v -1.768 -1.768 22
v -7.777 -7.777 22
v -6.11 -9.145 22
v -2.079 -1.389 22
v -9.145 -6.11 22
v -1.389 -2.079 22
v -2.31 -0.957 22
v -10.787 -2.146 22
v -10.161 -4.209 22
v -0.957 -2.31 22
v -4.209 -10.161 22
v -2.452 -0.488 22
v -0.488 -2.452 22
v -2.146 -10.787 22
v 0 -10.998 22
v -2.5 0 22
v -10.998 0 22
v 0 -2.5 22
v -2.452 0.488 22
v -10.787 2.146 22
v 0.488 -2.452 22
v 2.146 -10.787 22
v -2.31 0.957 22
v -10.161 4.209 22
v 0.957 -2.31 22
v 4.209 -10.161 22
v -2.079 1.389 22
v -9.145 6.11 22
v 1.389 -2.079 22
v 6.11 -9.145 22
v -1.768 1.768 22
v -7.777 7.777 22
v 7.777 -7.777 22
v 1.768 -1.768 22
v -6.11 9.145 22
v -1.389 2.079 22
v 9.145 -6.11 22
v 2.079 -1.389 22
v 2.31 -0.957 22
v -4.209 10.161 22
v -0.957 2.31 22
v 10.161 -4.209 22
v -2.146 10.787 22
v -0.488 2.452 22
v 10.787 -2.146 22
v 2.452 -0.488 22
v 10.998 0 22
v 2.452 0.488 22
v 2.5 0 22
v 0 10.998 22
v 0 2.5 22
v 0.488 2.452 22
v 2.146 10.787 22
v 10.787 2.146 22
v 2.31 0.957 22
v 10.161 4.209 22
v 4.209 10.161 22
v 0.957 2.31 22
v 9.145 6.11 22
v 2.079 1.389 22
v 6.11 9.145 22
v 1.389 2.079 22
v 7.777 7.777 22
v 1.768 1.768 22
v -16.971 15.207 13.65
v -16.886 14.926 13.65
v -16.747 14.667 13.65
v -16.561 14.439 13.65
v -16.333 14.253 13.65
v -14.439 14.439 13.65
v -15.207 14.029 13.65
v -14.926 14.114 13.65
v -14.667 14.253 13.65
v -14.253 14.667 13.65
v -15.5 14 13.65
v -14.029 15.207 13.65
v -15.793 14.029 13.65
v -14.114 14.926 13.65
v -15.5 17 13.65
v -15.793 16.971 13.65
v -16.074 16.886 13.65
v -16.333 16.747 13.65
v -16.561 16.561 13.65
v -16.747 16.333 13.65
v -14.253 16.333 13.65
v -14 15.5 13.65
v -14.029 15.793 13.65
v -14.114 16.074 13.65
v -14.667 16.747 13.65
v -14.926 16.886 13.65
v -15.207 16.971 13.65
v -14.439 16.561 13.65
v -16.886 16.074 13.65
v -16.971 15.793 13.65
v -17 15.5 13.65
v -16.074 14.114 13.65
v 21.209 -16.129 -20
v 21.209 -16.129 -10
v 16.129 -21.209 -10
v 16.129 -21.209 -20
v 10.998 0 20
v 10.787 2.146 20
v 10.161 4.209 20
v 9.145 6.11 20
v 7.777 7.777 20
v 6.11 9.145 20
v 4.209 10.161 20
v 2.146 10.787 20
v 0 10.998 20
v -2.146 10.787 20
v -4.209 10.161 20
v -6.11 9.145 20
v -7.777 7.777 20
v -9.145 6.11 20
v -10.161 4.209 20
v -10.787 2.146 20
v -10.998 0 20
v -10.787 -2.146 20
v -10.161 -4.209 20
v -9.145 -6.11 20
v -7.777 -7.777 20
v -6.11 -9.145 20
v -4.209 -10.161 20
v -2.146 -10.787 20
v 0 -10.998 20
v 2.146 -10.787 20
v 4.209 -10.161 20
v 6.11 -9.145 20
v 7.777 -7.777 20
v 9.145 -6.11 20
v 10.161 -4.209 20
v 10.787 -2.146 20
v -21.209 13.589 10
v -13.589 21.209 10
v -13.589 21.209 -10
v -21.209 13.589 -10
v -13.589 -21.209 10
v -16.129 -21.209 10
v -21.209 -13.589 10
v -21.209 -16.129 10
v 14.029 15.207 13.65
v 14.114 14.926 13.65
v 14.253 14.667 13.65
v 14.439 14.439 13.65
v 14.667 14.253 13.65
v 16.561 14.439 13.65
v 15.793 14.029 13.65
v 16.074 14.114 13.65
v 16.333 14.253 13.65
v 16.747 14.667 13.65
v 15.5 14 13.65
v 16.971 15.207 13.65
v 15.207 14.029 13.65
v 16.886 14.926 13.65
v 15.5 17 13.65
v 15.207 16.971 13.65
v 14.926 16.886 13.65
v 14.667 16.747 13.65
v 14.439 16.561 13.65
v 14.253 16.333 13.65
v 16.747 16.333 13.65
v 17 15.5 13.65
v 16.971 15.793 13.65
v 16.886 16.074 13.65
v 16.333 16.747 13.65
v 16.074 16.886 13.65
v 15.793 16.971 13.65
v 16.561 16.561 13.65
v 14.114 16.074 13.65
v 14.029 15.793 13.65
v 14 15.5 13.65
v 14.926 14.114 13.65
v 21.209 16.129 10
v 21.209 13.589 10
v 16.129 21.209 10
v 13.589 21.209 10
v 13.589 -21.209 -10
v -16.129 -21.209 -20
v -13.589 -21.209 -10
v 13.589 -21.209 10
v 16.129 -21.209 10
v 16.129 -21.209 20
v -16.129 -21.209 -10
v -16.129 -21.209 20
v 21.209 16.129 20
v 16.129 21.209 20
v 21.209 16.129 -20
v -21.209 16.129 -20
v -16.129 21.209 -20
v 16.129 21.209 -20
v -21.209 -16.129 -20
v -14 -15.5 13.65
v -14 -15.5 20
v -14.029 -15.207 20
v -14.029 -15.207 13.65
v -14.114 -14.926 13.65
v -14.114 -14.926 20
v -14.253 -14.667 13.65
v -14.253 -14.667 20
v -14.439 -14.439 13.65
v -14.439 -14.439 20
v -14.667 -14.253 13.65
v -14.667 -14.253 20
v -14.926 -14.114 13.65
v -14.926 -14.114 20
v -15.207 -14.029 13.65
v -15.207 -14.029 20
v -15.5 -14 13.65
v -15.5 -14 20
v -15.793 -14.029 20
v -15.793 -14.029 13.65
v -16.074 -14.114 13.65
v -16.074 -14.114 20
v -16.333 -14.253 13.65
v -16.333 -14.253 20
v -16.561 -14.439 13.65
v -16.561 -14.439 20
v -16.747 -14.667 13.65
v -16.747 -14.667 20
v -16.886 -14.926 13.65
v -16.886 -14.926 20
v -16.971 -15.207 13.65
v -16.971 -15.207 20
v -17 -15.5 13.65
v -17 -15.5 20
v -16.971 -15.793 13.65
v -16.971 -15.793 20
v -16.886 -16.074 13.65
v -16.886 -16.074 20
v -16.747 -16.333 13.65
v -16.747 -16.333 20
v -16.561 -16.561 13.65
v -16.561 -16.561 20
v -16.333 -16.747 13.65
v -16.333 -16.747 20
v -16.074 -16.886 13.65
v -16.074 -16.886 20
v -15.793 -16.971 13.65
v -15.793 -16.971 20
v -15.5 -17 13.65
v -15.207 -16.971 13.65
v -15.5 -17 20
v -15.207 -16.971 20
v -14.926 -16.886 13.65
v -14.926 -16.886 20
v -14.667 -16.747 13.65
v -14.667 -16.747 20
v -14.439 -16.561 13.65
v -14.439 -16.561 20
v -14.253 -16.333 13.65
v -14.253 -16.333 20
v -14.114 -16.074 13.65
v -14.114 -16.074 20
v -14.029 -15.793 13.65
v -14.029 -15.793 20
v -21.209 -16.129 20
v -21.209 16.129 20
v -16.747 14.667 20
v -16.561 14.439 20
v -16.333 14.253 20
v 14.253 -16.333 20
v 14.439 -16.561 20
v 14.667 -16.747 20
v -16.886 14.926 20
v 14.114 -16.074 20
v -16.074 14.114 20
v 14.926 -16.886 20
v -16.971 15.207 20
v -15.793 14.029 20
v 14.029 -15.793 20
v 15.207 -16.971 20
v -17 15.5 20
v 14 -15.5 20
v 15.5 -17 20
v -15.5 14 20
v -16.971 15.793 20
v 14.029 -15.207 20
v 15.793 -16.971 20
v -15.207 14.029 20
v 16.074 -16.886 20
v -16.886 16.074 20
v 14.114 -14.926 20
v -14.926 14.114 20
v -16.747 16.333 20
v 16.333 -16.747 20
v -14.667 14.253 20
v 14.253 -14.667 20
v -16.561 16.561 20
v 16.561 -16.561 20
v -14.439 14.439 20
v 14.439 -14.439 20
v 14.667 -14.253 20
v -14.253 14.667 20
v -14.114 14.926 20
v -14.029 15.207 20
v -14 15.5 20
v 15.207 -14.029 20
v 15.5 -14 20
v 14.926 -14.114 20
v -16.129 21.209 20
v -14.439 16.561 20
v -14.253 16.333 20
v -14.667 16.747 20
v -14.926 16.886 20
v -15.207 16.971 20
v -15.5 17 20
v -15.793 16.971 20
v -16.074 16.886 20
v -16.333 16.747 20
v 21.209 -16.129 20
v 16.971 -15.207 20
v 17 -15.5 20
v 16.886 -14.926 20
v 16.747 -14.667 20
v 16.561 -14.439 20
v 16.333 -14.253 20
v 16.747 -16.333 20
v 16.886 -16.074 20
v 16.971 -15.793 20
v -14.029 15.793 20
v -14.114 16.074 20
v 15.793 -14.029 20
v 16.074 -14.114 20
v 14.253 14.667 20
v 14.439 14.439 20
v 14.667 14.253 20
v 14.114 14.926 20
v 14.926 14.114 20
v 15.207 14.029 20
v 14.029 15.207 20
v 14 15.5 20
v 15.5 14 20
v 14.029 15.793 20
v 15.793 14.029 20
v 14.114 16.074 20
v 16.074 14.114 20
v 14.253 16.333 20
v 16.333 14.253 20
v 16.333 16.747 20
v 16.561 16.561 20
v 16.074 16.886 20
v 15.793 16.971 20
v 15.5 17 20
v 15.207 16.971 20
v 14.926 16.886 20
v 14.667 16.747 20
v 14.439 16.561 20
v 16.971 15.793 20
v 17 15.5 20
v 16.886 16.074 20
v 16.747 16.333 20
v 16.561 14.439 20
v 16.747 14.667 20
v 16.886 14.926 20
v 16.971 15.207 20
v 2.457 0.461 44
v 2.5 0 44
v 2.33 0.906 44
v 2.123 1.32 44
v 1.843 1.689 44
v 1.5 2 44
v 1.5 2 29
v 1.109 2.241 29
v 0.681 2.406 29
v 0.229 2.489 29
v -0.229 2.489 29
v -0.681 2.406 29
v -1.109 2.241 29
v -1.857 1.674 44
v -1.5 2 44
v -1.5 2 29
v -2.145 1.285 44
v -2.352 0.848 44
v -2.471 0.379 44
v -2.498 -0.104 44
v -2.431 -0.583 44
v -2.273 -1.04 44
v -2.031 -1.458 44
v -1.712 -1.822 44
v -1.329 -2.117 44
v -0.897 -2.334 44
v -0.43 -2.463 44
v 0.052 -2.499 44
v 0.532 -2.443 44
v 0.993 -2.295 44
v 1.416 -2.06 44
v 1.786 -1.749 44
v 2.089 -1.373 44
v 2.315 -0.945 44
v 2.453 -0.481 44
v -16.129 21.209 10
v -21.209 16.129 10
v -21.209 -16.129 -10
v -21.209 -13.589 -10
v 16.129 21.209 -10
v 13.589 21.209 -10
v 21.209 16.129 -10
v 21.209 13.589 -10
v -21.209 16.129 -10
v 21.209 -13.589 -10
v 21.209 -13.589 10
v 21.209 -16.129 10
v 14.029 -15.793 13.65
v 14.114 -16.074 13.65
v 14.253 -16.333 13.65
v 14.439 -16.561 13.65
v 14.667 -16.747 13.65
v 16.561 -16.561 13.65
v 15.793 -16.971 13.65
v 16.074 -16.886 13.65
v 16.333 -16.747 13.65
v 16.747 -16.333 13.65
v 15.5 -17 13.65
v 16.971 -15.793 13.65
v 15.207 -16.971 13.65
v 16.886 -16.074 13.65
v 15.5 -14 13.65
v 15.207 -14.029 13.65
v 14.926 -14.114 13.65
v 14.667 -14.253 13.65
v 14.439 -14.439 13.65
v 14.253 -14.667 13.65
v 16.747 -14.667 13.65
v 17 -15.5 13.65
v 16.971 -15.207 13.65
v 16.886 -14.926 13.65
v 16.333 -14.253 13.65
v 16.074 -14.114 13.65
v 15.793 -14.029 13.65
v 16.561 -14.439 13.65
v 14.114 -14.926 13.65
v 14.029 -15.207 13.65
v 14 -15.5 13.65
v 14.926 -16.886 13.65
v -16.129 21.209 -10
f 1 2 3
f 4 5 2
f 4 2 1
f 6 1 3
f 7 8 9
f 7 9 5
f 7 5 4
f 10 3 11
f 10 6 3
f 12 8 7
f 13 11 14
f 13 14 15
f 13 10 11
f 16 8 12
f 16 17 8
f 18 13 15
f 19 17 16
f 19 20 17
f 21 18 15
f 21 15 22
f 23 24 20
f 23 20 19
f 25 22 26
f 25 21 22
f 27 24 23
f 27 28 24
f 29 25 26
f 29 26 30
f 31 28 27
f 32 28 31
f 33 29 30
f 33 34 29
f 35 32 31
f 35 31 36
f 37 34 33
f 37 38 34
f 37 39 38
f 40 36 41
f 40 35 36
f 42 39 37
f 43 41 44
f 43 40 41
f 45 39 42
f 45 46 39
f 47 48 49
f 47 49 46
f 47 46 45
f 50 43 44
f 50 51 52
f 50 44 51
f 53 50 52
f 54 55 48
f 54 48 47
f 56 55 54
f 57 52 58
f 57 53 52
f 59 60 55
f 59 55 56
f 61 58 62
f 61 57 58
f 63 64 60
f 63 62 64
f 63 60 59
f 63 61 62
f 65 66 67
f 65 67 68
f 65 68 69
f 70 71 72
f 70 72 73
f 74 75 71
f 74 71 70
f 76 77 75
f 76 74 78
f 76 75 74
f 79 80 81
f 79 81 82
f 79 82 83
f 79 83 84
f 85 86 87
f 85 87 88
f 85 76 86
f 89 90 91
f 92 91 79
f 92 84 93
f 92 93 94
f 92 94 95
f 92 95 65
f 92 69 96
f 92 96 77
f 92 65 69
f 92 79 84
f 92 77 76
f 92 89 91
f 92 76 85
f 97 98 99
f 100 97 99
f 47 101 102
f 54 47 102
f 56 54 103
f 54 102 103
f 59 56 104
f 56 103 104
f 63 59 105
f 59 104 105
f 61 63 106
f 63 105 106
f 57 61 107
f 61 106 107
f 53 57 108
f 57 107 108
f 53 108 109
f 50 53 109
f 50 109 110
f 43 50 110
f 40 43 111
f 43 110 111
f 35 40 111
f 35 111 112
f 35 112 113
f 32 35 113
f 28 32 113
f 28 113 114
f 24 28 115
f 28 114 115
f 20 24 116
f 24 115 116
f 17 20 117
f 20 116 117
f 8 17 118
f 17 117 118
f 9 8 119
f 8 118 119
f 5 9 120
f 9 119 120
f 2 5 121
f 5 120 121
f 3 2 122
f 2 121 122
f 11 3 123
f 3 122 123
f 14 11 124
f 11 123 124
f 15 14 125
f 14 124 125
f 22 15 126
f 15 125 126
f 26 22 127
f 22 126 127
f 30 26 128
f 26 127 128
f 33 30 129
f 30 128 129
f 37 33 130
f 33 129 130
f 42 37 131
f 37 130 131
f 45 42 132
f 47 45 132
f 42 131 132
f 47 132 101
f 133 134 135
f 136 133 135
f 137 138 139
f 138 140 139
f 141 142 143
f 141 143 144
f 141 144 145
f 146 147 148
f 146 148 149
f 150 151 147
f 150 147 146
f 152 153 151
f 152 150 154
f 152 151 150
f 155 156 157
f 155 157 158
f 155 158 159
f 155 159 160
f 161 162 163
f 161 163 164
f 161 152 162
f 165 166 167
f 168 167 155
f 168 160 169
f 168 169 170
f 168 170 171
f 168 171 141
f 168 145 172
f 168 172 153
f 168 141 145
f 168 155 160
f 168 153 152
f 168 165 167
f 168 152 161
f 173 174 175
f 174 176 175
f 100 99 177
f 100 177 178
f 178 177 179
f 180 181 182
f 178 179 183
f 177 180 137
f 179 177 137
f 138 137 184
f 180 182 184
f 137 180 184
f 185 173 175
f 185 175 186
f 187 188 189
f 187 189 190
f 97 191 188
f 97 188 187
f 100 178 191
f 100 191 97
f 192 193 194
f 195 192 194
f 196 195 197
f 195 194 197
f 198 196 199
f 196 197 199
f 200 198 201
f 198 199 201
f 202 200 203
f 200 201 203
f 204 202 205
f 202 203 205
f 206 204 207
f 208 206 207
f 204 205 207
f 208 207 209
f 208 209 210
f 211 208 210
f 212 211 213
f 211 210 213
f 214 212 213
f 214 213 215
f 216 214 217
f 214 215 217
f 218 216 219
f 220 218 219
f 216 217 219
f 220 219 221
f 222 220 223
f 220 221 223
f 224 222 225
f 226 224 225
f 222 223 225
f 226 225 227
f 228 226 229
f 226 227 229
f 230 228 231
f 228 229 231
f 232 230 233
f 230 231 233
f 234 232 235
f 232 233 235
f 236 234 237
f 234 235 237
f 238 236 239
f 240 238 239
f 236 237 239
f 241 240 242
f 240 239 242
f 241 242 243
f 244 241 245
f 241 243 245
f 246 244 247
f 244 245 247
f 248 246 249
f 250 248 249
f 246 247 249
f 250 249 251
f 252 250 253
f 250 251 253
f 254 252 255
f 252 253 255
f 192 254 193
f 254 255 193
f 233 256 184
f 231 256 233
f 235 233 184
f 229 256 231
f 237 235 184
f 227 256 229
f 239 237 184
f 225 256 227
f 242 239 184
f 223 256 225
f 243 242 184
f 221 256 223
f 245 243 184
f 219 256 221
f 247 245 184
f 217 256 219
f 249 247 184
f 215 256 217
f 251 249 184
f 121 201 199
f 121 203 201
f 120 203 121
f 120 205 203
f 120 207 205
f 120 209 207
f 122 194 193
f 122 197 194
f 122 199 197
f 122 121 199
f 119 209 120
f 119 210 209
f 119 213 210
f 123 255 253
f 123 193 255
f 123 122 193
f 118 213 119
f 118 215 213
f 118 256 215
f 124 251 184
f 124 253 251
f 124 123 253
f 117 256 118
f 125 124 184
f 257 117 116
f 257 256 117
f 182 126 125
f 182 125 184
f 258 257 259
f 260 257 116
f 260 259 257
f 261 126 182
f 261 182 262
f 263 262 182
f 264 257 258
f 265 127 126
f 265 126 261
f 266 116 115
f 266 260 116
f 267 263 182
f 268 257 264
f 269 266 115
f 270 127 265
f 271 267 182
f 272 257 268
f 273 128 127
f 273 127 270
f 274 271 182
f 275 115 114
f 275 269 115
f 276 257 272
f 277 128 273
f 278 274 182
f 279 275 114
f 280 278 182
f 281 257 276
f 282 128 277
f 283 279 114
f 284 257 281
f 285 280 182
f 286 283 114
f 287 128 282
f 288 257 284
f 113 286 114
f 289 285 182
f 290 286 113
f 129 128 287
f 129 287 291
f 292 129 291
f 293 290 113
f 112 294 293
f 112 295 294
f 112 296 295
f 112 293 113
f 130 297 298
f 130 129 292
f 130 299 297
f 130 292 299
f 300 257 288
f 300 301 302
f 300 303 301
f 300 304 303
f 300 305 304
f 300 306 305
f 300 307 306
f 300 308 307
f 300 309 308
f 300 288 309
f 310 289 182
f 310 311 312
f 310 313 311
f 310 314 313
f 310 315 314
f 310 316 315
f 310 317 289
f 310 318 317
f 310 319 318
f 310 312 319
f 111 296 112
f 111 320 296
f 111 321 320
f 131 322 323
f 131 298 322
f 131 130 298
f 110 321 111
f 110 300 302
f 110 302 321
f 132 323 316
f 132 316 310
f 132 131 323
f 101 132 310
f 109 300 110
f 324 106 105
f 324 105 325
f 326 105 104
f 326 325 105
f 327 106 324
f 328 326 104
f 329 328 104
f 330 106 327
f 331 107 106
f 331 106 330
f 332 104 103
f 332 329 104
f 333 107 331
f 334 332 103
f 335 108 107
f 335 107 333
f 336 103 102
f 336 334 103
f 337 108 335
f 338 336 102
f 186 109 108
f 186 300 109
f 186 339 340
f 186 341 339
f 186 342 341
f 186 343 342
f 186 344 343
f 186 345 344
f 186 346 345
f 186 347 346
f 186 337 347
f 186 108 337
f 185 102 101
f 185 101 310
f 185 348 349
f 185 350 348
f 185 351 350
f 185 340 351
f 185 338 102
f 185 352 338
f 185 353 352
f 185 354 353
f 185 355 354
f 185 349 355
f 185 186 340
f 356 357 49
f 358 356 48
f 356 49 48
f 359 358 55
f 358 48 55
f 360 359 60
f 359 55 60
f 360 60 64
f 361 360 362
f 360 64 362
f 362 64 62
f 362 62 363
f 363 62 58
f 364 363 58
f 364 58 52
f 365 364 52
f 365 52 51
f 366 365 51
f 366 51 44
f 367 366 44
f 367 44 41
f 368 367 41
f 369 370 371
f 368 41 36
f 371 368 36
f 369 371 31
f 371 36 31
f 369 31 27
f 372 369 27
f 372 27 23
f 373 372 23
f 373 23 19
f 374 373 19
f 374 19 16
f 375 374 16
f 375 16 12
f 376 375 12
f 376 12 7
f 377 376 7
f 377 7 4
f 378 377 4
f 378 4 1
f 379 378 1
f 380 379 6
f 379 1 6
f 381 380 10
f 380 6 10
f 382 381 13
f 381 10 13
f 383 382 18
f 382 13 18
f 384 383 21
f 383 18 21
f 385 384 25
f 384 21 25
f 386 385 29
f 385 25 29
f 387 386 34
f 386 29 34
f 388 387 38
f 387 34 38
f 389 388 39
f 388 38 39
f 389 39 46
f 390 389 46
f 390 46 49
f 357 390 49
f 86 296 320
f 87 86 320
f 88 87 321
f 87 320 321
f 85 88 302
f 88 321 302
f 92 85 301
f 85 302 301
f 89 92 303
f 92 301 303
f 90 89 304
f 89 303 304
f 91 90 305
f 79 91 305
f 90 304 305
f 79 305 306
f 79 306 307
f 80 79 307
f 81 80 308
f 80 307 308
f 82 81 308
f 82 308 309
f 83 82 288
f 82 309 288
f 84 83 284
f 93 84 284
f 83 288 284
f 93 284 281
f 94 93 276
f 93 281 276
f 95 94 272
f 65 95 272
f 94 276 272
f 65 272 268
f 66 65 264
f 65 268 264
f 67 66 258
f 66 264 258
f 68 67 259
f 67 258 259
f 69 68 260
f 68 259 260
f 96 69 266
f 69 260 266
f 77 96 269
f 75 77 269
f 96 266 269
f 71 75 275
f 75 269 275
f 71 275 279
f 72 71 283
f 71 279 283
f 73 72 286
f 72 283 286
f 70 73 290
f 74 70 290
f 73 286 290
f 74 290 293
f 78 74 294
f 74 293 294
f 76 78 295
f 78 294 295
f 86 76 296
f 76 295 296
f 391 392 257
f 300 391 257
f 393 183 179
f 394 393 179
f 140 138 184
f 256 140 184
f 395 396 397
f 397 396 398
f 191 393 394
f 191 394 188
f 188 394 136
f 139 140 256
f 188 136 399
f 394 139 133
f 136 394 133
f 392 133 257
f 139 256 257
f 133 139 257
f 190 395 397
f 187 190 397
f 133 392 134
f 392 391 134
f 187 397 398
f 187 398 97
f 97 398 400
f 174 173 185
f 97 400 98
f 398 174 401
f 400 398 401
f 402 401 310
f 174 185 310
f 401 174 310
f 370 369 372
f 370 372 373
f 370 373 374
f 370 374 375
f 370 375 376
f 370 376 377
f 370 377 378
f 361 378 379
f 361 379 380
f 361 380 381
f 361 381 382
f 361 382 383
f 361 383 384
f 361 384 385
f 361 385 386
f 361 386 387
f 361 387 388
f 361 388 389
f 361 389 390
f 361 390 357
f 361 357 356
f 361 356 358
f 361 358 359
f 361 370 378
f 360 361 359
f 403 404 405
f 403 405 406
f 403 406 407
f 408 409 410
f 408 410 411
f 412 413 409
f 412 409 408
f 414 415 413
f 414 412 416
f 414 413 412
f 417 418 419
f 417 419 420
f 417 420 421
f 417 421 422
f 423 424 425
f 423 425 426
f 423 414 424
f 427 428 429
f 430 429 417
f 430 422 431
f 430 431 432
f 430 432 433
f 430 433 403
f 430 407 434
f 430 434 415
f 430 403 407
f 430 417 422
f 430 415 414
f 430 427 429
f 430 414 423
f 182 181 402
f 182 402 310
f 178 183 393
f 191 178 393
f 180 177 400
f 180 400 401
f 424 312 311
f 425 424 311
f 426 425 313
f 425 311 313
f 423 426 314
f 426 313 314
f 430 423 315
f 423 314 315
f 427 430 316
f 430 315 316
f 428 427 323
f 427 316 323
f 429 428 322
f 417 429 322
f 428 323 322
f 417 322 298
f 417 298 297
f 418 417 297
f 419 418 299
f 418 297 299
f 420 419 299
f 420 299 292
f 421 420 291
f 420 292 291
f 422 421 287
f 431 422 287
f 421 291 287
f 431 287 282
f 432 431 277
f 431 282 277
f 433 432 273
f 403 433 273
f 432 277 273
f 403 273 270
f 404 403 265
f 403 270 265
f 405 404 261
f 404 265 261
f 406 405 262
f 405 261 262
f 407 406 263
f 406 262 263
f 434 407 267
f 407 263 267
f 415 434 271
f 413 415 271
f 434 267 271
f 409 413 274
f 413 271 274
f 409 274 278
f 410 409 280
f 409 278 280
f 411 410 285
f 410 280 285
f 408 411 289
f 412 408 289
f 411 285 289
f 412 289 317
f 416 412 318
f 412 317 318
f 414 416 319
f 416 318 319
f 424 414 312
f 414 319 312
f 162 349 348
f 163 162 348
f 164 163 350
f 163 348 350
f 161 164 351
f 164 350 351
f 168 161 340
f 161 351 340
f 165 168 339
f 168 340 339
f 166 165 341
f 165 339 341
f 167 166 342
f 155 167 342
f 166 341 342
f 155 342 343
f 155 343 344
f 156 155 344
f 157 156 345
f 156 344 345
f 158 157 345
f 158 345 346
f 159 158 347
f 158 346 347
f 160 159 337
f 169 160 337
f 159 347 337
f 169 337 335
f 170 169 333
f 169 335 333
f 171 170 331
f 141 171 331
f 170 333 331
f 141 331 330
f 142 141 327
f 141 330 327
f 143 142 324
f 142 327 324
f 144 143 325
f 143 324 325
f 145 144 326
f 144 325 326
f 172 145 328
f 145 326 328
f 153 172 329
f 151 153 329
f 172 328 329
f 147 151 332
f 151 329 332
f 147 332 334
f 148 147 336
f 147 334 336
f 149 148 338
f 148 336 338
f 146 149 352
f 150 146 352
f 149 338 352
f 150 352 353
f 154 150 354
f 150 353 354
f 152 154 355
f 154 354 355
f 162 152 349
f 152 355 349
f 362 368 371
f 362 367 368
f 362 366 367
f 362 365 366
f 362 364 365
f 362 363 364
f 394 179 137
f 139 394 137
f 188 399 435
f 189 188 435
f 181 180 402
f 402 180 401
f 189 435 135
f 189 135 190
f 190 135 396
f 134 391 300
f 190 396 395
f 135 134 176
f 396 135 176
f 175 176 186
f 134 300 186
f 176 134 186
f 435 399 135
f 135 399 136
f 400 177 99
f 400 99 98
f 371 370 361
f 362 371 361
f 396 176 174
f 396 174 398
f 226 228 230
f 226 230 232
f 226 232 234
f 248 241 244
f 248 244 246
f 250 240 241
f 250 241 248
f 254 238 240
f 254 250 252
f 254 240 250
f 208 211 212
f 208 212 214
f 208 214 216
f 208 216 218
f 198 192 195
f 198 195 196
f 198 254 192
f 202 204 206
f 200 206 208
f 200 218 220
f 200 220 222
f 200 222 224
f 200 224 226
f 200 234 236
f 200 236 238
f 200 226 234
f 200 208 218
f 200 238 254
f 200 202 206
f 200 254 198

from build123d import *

# Parameters (mm, degrees)
F0_W      = 42.418
F0_H      = 42.418
F1_DEPTH  = 10
F2_SIZE   = 7.62
F4_DEPTH  = 10
F5_SIZE   = 5.08
F7_DEPTH  = 10
F8_R      = 10.9982
F9_DEPTH  = 2
F10_R     = 2.5
F11_DEPTH = 22
F13_DEPTH = 15
F14_R     = 1.5
F15_DEPTH = 6.35


with BuildPart() as f1:
    # F0 (on Top) → F1 (new body, symmetric)
    with BuildSketch(Plane.XY):
        Rectangle(F0_W, F0_H)
    extrude(amount=F1_DEPTH, both=True)

    # F2
    f2_edges = [f1.edges().sort_by_distance(p)[0] for p in [
        (21.209, 21.209, 0),
        (-21.209, 21.209, 0),
        (-21.209, -21.209, 0),
        (21.209, -21.209, 0),
    ]]
    chamfer(f2_edges, length=F2_SIZE)

    # F3 (on face) → F4 (join)
    with BuildSketch(Plane.XY.offset(10)):
        Polygon((13.589, 21.209), (-13.589, 21.209), (-21.209, 13.589), (-21.209, -13.589), (-13.589, -21.209), (13.589, -21.209), (21.209, -13.589), (21.209, 13.589), align=None)
        Polygon((21.209, 21.209), (13.589, 21.209), (21.209, 13.589), align=None)
        Polygon((-13.589, 21.209), (-21.209, 21.209), (-21.209, 13.589), align=None)
        Polygon((-13.589, -21.209), (-21.209, -13.589), (-21.209, -21.209), align=None)
        Polygon((21.209, -21.209), (21.209, -13.589), (13.589, -21.209), align=None)
    extrude(amount=F4_DEPTH)

    # F5
    f5_edges = [f1.edges().sort_by_distance(p)[0] for p in [
        (21.209, 21.209, 15),
        (-21.209, 21.209, 15),
        (-21.209, -21.209, 15),
        (21.209, -21.209, 15),
    ]]
    chamfer(f5_edges, length=F5_SIZE)

    # F6 (on face) → F7 (join)
    with BuildSketch(Plane(origin=(0, 0, -10), x_dir=(1, 0, 0), z_dir=(0, 0, -1))):
        Polygon((-13.589, 21.209), (-16.129, 21.209), (-21.209, 16.129), (-21.209, 13.589), align=None)
        Polygon((16.129, 21.209), (13.589, 21.209), (21.209, 13.589), (21.209, 16.129), align=None)
        Polygon((21.209, -16.129), (21.209, -13.589), (13.589, -21.209), (16.129, -21.209), align=None)
        Polygon((-13.589, -21.209), (-21.209, -13.589), (-21.209, -16.129), (-16.129, -21.209), align=None)
        Polygon((13.589, 21.209), (-13.589, 21.209), (-21.209, 13.589), (-21.209, -13.589), (-13.589, -21.209), (13.589, -21.209), (21.209, -13.589), (21.209, 13.589), align=None)
    extrude(amount=F7_DEPTH)

    # F8 (on face) → F9 (join)
    with BuildSketch(Plane.XY.offset(20)):
        Circle(F8_R)
    extrude(amount=F9_DEPTH)

    # F10 (on face) → F11 (join)
    with BuildSketch(Plane.XY.offset(22)):
        Circle(F10_R)
    extrude(amount=F11_DEPTH)

    # F12 (on face) → F13 (cut)
    with BuildSketch(Plane.XY.offset(44)):
        with BuildLine():
            Line((2.6203631624, 2.9334036984), (-2.6333660554, 2.9334036984))
            Line((-2.6333660554, 2.9334036984), (-2.6333660554, 2))
            Line((-2.6333660554, 2), (-1.5, 2))
            ThreePointArc((-1.5, 2), (0, 2.5), (1.5, 2))
            Line((1.5, 2), (2.6203631624, 2))
            Line((2.6203631624, 2), (2.6203631624, 2.9334036984))
        make_face()
        with BuildLine():
            ThreePointArc((1.5, 2), (0, 2.5), (-1.5, 2))
            Line((-1.5, 2), (1.5, 2))
        make_face()
    extrude(amount=-F13_DEPTH, mode=Mode.SUBTRACT)

    # F14 (on face) → F15 (cut)
    with BuildSketch(Plane.XY.offset(20)):
        with Locations((-15.5, 15.5)):
            Circle(F14_R)
        with Locations((15.5, 15.5)):
            Circle(F14_R)
        with Locations((15.5, -15.5)):
            Circle(F14_R)
        with Locations((-15.5, -15.5)):
            Circle(F14_R)
    extrude(amount=-F15_DEPTH, mode=Mode.SUBTRACT)


with BuildPart() as f16_1:
    # F16: copy of F1
    add(f1.part)


solid = f1.part
